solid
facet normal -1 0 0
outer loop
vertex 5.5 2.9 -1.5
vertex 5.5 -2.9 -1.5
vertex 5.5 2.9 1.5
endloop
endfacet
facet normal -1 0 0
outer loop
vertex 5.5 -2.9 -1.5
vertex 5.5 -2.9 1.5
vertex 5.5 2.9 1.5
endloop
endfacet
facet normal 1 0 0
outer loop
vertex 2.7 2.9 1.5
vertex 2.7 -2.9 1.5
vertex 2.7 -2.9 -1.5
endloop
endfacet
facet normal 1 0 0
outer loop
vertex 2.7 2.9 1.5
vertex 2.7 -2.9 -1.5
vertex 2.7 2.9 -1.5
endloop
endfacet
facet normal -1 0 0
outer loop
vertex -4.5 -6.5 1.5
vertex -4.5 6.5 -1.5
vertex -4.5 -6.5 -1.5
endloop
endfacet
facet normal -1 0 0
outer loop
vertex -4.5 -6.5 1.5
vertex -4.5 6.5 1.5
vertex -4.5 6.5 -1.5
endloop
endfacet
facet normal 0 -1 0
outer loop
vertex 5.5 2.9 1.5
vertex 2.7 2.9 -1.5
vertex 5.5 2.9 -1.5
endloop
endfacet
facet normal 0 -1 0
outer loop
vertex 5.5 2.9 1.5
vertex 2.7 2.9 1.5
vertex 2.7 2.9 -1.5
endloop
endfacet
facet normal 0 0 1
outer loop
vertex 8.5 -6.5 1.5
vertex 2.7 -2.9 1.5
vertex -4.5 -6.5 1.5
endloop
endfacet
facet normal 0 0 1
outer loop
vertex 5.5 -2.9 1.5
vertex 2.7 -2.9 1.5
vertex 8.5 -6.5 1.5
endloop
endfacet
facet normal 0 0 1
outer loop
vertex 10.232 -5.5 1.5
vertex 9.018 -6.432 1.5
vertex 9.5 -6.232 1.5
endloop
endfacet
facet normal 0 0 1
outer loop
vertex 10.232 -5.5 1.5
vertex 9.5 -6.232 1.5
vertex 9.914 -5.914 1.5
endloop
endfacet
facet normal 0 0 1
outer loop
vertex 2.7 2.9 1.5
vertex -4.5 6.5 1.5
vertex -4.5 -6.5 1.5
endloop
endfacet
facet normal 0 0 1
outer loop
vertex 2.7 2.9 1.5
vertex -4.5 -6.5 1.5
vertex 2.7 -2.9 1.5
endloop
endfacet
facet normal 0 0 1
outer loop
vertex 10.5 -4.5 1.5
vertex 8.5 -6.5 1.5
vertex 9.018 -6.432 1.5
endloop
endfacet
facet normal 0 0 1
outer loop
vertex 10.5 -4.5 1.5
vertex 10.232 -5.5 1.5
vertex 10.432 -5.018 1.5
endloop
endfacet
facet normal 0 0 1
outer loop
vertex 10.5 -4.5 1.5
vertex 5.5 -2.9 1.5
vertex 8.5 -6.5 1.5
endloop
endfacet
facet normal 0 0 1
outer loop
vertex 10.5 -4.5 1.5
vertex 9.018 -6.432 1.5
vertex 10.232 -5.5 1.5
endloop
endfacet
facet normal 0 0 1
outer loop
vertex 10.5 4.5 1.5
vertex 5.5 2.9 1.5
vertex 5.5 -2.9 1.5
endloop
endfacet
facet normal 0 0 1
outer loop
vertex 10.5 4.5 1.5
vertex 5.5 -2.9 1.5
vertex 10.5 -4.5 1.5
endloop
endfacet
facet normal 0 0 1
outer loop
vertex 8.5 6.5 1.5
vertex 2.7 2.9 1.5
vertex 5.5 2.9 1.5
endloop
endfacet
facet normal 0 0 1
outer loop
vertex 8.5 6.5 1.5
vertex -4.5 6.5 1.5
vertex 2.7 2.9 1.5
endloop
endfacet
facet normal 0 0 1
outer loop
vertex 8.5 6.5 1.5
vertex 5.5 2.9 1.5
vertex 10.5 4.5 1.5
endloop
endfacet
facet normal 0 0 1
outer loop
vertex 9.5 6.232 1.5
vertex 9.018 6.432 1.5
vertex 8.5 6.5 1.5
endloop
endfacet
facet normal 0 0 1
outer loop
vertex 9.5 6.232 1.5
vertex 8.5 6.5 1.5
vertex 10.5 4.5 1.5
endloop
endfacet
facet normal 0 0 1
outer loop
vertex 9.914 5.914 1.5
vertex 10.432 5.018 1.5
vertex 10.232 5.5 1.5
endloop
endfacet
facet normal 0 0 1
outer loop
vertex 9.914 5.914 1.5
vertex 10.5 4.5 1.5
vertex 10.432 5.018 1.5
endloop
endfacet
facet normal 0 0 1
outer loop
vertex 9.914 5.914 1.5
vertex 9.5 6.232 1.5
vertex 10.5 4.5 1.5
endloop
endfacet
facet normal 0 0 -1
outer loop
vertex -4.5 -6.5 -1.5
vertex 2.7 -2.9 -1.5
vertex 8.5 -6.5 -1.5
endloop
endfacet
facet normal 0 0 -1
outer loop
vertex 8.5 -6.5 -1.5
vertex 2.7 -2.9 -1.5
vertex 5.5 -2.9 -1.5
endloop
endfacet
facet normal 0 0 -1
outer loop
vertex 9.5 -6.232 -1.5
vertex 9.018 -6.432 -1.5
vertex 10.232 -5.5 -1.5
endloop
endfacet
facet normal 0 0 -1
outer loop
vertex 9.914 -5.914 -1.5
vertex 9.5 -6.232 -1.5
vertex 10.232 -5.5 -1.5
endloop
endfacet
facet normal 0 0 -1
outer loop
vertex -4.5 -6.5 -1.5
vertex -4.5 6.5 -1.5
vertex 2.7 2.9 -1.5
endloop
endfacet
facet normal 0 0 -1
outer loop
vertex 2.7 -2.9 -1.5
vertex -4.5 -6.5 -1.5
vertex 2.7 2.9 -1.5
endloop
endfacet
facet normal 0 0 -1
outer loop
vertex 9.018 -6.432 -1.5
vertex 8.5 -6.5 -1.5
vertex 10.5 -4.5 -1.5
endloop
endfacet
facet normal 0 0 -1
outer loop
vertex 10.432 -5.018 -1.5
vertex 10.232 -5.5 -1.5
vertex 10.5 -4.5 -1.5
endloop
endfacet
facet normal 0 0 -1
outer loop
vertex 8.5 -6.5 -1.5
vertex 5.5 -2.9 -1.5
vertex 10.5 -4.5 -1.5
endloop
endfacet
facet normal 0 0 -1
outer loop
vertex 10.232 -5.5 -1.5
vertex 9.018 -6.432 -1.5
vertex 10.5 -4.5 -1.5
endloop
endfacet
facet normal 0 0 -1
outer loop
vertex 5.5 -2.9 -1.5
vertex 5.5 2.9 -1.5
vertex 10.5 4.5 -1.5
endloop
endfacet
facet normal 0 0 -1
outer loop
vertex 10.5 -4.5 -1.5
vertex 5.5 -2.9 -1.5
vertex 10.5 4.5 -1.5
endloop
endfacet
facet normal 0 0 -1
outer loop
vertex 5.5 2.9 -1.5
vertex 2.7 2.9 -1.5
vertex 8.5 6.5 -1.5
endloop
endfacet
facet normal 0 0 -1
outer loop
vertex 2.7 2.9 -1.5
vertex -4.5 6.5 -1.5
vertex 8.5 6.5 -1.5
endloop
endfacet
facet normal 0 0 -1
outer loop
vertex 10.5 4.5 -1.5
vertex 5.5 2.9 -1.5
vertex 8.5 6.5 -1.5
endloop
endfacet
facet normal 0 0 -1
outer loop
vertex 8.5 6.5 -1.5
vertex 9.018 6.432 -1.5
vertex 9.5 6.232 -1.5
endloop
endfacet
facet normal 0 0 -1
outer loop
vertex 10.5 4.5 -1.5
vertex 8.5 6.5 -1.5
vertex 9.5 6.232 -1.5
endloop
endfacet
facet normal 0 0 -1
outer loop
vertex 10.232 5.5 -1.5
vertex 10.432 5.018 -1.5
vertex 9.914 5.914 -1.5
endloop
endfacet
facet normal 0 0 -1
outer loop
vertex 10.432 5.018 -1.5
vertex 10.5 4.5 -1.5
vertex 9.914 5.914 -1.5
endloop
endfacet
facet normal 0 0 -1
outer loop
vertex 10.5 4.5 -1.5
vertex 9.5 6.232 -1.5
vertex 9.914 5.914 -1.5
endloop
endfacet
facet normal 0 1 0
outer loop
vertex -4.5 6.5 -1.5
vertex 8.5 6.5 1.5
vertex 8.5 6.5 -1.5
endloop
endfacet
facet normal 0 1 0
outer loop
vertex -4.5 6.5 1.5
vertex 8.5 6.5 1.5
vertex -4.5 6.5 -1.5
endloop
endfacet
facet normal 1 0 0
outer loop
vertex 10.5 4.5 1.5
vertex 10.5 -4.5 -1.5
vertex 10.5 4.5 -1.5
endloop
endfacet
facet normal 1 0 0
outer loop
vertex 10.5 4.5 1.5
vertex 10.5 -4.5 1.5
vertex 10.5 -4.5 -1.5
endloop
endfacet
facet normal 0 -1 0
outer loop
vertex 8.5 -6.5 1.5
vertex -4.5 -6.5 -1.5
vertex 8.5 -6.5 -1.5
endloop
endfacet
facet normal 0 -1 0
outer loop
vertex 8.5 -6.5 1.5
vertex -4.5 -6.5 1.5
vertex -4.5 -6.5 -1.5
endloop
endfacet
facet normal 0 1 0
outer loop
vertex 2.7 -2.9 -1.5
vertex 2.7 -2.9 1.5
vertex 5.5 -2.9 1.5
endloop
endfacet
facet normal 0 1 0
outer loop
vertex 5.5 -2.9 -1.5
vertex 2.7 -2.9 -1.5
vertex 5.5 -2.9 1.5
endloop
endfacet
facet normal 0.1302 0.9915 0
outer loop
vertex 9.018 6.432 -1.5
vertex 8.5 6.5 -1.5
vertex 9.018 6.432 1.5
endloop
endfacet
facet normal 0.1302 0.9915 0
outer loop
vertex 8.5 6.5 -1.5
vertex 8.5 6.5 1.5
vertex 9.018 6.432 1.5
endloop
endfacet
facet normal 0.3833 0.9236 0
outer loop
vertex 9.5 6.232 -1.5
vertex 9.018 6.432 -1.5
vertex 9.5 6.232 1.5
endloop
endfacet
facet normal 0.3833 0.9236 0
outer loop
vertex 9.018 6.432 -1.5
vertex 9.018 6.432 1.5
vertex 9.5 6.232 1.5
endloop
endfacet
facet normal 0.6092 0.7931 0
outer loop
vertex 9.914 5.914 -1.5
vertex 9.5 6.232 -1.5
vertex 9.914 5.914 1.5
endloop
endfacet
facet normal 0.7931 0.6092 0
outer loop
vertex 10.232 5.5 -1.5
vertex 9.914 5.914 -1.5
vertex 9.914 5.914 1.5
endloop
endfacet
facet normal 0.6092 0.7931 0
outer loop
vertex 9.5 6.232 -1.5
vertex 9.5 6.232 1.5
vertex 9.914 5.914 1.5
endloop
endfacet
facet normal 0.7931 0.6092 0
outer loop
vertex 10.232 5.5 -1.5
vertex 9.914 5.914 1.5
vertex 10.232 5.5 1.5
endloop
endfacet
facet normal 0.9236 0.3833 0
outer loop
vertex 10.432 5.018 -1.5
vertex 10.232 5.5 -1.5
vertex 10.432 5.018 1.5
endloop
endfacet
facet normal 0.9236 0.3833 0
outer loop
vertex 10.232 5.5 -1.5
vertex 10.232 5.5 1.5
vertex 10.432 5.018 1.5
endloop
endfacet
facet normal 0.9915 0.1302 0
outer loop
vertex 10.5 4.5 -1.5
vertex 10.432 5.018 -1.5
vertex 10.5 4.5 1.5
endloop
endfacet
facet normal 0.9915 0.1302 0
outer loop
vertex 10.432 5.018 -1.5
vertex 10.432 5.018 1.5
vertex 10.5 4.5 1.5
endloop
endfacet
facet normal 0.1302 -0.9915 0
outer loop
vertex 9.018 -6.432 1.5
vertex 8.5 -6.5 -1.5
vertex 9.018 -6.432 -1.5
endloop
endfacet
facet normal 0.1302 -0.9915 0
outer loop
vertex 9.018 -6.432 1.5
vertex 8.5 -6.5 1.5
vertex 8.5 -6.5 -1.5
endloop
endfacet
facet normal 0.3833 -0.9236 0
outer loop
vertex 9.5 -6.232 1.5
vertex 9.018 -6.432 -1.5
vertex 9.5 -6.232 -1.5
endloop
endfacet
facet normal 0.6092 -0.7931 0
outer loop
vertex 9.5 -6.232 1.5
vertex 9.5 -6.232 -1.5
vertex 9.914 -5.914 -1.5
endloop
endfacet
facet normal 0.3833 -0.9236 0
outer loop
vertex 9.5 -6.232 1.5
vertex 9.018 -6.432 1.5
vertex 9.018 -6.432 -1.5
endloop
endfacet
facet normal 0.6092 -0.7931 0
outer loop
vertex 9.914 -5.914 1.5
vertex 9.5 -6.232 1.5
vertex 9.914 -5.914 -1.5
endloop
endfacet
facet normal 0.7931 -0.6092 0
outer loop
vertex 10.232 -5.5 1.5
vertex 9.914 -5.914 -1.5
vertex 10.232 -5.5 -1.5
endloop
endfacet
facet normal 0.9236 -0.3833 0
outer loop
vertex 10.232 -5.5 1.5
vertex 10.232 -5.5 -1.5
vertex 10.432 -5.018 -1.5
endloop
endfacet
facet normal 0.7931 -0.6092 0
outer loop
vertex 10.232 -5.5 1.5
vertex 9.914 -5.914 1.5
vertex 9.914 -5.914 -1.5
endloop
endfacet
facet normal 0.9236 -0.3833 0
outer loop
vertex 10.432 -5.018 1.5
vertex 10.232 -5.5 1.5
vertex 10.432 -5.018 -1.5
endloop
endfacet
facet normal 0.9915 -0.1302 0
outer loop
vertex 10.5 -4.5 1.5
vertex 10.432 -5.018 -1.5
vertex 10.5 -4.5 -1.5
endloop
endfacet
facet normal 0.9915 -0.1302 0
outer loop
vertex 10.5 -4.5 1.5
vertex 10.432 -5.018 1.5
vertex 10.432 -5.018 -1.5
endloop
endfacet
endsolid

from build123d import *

# Parameters (mm, degrees)
CROQUIS1_W              = 2.8
CROQUIS1_H              = 5.8
SALIENTE_EXTRUIR1_DEPTH = 1.5
REDONDEO1_R             = 2


with BuildPart() as part:
    # Croquis1 → Saliente-Extruir1 (new, symmetric)
    # profile 1 of 3: a face of its own
    with BuildSketch(Plane.XY):
        Polygon((-4.5, -2.5), (-4.5, -6.5), (-1.5, -6.5), (10.5, -6.5), (10.5, 6.5), (-1.5, 6.5), (-4.5, 6.5), (-4.5, 0.5), align=None)
        with Locations((4.1, 0)):
            Rectangle(CROQUIS1_W, CROQUIS1_H, mode=Mode.SUBTRACT)
    # profile 2 of 3: a face of its own
    with BuildSketch(Plane.XY):
        Polygon((-4.5, -2.5), (-4.5, -6.5), (-1.5, -6.5), (10.5, -6.5), (10.5, 6.5), (-1.5, 6.5), (-4.5, 6.5), (-4.5, 0.5), align=None)
        with Locations((4.1, 0)):
            Rectangle(CROQUIS1_W, CROQUIS1_H, mode=Mode.SUBTRACT)
    # profile 3 of 3: a face of its own
    with BuildSketch(Plane.XY):
        Polygon((-4.5, -2.5), (-4.5, -6.5), (-1.5, -6.5), (10.5, -6.5), (10.5, 6.5), (-1.5, 6.5), (-4.5, 6.5), (-4.5, 0.5), align=None)
        with Locations((4.1, 0)):
            Rectangle(CROQUIS1_W, CROQUIS1_H, mode=Mode.SUBTRACT)
    extrude(amount=SALIENTE_EXTRUIR1_DEPTH, both=True)

    # Redondeo1
    redondeo1_edges = [part.edges().sort_by_distance(p)[0] for p in [
        (10.5, 6.5, 0),
        (10.5, -6.5, 0),
    ]]
    fillet(redondeo1_edges, radius=REDONDEO1_R)


solid = part.part
